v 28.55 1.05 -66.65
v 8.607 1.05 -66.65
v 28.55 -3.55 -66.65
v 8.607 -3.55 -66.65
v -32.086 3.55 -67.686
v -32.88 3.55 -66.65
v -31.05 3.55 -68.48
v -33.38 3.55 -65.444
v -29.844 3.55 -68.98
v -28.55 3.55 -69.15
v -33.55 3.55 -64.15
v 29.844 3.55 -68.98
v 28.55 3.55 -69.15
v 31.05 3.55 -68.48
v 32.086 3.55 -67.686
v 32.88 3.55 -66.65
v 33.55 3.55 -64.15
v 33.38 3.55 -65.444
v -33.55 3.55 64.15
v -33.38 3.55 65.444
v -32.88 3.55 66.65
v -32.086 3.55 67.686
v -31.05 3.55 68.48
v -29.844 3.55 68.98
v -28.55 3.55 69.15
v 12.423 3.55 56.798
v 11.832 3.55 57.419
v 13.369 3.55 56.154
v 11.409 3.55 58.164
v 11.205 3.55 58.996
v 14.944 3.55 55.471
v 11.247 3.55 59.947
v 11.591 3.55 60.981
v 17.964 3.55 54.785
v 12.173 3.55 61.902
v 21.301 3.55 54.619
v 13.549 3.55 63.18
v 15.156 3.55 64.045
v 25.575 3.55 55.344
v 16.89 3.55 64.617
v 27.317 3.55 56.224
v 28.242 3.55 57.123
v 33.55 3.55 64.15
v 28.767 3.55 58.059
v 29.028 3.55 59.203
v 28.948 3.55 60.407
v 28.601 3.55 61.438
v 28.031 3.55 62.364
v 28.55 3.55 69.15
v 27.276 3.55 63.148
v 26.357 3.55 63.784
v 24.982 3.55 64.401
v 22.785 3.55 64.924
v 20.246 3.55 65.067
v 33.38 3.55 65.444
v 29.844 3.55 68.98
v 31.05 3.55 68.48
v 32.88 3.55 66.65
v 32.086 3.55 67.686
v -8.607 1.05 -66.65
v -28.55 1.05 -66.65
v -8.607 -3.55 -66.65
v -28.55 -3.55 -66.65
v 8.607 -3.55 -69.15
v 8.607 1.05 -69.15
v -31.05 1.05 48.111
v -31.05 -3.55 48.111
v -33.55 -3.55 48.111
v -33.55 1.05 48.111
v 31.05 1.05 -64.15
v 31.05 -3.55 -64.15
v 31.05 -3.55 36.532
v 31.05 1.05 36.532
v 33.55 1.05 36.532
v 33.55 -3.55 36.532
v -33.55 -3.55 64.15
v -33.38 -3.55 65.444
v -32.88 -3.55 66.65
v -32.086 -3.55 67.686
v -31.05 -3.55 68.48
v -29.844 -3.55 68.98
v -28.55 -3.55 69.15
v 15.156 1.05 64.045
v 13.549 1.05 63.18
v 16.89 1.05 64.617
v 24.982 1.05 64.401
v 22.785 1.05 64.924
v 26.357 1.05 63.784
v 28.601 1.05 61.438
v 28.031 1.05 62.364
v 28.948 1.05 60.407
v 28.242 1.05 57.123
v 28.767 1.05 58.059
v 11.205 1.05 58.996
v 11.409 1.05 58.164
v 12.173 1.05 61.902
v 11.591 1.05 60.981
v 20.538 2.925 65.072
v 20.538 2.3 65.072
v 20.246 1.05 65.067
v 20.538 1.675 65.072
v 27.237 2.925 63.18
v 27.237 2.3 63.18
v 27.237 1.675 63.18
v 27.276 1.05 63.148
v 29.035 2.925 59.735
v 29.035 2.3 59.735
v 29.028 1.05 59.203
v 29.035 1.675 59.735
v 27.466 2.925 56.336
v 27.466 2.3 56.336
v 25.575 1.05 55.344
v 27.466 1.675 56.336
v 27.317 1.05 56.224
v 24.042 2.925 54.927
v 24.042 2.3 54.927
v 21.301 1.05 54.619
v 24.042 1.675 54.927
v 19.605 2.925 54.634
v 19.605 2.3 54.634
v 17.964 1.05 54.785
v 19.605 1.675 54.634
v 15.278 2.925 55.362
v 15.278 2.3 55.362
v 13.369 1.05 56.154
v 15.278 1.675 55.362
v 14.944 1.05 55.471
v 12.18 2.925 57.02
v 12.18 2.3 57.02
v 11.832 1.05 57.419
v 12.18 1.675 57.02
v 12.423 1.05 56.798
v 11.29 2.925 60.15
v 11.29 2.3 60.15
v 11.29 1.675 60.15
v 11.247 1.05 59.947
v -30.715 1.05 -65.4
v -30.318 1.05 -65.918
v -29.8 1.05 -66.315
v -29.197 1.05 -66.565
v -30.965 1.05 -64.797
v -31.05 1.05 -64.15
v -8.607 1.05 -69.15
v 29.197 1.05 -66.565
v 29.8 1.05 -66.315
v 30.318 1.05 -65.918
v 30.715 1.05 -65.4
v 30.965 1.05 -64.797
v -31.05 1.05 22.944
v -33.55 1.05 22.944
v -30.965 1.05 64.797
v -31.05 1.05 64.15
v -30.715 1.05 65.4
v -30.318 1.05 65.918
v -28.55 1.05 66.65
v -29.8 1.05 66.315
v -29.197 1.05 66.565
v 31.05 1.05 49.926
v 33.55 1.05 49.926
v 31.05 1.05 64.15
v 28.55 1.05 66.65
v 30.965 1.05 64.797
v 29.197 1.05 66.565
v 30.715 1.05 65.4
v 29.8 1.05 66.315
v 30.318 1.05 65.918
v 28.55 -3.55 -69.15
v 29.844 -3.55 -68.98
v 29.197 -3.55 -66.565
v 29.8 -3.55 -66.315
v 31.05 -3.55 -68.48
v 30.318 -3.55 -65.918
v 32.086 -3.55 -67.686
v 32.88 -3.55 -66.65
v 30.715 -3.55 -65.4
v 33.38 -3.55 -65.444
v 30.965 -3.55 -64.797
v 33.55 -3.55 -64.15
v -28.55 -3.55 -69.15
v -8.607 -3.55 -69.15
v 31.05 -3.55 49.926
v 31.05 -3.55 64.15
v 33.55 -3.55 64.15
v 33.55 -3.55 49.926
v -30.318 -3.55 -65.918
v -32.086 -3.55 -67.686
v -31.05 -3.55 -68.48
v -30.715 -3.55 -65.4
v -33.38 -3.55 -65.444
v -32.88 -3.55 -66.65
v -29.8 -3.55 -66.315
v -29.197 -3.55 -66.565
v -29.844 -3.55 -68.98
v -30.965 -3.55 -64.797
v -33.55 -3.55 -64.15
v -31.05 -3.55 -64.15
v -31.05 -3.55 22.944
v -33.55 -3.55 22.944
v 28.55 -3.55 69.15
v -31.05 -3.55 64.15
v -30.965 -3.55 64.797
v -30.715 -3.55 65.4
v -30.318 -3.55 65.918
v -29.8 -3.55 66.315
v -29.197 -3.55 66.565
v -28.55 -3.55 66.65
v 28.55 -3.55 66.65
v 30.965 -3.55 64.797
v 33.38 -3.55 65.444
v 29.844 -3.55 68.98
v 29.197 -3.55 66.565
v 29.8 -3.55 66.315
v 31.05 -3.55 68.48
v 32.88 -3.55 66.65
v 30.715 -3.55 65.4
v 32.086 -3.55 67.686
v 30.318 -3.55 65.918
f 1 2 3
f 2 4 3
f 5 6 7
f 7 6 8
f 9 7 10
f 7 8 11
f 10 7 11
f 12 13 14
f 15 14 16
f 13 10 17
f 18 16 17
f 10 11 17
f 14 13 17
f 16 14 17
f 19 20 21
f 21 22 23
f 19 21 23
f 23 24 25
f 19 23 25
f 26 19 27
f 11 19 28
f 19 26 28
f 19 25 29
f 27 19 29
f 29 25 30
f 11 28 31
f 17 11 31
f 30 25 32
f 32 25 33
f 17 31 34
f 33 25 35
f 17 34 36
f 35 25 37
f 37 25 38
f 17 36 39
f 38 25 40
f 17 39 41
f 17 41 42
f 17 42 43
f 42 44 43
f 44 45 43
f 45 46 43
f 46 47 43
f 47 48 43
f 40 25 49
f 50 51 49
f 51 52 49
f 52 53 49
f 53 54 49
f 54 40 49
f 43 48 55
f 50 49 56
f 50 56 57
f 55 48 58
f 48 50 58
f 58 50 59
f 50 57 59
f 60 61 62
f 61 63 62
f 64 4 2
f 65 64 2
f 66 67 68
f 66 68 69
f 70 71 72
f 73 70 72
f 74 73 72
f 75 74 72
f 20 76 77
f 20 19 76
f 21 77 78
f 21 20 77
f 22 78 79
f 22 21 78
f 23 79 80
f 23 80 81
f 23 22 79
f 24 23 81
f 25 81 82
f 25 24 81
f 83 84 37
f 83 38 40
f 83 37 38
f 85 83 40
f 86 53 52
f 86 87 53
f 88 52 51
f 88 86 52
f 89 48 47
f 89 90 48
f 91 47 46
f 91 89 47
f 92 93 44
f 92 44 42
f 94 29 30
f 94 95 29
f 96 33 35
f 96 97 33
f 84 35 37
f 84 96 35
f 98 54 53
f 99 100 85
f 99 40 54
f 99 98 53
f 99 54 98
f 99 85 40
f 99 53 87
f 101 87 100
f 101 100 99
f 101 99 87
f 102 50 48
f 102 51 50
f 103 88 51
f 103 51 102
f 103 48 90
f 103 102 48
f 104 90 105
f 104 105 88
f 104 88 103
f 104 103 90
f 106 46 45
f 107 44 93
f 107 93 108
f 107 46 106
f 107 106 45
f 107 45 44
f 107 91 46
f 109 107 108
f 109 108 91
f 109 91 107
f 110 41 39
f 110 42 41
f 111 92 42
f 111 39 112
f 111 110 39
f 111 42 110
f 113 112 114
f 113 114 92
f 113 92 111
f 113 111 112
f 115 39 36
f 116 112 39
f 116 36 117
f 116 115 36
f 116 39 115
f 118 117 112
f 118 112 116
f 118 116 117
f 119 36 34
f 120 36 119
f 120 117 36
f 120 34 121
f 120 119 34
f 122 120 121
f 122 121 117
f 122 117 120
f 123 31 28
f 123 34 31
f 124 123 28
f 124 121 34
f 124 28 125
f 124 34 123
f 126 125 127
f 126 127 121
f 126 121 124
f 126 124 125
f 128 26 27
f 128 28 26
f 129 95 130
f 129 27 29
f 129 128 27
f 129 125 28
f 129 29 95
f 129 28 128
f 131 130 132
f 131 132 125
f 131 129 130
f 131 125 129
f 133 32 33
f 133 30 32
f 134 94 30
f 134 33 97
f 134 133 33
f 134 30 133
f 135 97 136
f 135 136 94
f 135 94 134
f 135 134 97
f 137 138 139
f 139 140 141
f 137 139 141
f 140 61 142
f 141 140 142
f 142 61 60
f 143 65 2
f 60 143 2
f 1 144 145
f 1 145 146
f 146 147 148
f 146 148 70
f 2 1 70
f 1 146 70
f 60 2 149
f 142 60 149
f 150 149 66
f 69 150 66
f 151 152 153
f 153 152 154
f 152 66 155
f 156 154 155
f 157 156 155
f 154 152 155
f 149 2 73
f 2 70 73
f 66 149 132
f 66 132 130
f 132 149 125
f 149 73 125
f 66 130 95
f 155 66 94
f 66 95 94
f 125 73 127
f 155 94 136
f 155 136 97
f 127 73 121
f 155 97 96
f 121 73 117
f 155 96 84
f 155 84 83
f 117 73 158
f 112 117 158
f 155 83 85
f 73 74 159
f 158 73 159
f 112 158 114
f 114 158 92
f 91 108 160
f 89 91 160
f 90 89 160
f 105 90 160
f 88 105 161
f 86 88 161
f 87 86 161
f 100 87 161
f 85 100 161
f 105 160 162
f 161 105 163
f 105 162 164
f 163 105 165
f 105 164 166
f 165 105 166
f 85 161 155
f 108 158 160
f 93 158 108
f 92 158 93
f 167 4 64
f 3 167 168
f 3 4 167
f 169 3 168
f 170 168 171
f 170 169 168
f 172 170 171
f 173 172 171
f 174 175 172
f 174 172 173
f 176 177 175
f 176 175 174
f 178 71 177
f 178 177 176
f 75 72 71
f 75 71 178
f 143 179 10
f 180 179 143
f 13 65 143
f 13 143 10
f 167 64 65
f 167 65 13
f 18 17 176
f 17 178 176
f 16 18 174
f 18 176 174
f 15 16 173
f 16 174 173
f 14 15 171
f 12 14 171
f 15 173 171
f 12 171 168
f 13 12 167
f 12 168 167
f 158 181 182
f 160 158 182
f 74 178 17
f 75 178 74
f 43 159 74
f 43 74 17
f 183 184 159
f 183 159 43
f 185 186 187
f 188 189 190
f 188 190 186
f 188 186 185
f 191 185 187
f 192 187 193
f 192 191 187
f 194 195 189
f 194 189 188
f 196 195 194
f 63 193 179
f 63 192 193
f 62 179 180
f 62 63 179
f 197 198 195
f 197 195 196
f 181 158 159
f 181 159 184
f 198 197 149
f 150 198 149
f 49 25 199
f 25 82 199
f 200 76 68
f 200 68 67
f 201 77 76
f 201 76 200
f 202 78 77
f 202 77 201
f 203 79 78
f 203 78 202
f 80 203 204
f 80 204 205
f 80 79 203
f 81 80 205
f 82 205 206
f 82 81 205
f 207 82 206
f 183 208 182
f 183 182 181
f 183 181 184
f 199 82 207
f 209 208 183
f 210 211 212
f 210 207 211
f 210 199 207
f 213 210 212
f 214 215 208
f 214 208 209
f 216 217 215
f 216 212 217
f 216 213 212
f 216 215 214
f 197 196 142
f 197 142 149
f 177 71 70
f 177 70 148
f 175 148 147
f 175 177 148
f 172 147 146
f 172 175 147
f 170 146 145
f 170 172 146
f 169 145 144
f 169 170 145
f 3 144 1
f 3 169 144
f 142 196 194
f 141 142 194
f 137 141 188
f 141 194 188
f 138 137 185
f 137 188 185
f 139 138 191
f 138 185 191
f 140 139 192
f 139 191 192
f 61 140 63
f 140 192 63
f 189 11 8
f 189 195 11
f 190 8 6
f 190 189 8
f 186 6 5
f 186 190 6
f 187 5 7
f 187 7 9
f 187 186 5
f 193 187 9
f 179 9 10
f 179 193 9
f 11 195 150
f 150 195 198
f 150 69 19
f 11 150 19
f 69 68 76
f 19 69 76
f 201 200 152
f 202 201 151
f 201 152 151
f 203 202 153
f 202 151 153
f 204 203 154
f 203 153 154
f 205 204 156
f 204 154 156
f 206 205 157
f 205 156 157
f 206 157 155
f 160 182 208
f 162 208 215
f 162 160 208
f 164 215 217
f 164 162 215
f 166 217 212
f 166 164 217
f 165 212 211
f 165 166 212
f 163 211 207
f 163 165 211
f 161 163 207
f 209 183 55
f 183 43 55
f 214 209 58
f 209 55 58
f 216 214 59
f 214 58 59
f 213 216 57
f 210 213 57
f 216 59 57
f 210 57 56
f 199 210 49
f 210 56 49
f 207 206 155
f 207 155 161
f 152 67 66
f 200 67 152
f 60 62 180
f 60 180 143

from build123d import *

# Parameters (mm, degrees)
F0_W      = 67.1
F0_H      = 138.3
F1_DEPTH  = 3.55
F2_R      = 5
F3_T      = -2.5
F5_DEPTH  = 12.5
F6_W      = 17.2149091959
F6_H      = 4.6
F7_DEPTH  = 12.5
F8_W      = 4.6
F8_H      = 25.1665320247
F9_DEPTH  = 12.5
F10_W     = 4.6
F10_H     = 13.3939161897
F11_DEPTH = 12.5


with BuildPart() as f1:
    # F0 (on Front) → F1 (new body, symmetric)
    with BuildSketch(Plane.XZ):
        Rectangle(F0_W, F0_H)
    extrude(amount=F1_DEPTH, both=True)

    # F2
    f2_edges = [f1.edges().sort_by_distance(p)[0] for p in [
        (-33.55, 0, 69.15),
        (33.55, 0, 69.15),
        (-33.55, 0, -69.15),
        (33.55, 0, -69.15),
    ]]
    fillet(f2_edges, radius=F2_R)

    # F3
    f3_openings = [f1.faces().sort_by_distance(p)[0] for p in [
        (0, -3.55, 0),
    ]]
    offset(amount=F3_T, openings=f3_openings)

    # F4 (on Front) → F5 (cut, symmetric)
    with BuildSketch(Plane.XZ):
        with BuildLine():
            add(Edge.make_bspline(
                [(13.5491024703, 63.1798133254), (17.0743458114, 65.6223290722), (29.066168273, 65.8951681057), (30.1492148881, 53.2998867845), (9.159231679, 54.5898814711), (11.1556270119, 61.5214592968), (13.5491024703, 63.1798133254)],
                knots=[0, 0, 0, 0, 0.2904013559, 0.4958031268, 0.8028310527, 1, 1, 1, 1], degree=3))
        make_face()
    extrude(amount=F5_DEPTH, both=True, mode=Mode.SUBTRACT)

    # F6 (on face) → F7 (cut, symmetric)
    with BuildSketch(Plane.XY.offset(-66.65)):
        with Locations((0, -1.25)):
            Rectangle(F6_W, F6_H)
    extrude(amount=F7_DEPTH, both=True, mode=Mode.SUBTRACT)

    # F8 (on face) → F9 (cut, symmetric)
    with BuildSketch(Plane.YZ.offset(-31.05)):
        with Locations((-1.25, 35.5272786692)):
            Rectangle(F8_W, F8_H)
    extrude(amount=F9_DEPTH, both=True, mode=Mode.SUBTRACT)

    # F10 (on face) → F11 (cut, symmetric)
    with BuildSketch(Plane(origin=(31.05, 0, 0), x_dir=(0, -1, 0), z_dir=(-1, 0, 0))):
        with Locations((1.25, 43.2292446494)):
            Rectangle(F10_W, F10_H)
    extrude(amount=F11_DEPTH, both=True, mode=Mode.SUBTRACT)


solid = f1.part
